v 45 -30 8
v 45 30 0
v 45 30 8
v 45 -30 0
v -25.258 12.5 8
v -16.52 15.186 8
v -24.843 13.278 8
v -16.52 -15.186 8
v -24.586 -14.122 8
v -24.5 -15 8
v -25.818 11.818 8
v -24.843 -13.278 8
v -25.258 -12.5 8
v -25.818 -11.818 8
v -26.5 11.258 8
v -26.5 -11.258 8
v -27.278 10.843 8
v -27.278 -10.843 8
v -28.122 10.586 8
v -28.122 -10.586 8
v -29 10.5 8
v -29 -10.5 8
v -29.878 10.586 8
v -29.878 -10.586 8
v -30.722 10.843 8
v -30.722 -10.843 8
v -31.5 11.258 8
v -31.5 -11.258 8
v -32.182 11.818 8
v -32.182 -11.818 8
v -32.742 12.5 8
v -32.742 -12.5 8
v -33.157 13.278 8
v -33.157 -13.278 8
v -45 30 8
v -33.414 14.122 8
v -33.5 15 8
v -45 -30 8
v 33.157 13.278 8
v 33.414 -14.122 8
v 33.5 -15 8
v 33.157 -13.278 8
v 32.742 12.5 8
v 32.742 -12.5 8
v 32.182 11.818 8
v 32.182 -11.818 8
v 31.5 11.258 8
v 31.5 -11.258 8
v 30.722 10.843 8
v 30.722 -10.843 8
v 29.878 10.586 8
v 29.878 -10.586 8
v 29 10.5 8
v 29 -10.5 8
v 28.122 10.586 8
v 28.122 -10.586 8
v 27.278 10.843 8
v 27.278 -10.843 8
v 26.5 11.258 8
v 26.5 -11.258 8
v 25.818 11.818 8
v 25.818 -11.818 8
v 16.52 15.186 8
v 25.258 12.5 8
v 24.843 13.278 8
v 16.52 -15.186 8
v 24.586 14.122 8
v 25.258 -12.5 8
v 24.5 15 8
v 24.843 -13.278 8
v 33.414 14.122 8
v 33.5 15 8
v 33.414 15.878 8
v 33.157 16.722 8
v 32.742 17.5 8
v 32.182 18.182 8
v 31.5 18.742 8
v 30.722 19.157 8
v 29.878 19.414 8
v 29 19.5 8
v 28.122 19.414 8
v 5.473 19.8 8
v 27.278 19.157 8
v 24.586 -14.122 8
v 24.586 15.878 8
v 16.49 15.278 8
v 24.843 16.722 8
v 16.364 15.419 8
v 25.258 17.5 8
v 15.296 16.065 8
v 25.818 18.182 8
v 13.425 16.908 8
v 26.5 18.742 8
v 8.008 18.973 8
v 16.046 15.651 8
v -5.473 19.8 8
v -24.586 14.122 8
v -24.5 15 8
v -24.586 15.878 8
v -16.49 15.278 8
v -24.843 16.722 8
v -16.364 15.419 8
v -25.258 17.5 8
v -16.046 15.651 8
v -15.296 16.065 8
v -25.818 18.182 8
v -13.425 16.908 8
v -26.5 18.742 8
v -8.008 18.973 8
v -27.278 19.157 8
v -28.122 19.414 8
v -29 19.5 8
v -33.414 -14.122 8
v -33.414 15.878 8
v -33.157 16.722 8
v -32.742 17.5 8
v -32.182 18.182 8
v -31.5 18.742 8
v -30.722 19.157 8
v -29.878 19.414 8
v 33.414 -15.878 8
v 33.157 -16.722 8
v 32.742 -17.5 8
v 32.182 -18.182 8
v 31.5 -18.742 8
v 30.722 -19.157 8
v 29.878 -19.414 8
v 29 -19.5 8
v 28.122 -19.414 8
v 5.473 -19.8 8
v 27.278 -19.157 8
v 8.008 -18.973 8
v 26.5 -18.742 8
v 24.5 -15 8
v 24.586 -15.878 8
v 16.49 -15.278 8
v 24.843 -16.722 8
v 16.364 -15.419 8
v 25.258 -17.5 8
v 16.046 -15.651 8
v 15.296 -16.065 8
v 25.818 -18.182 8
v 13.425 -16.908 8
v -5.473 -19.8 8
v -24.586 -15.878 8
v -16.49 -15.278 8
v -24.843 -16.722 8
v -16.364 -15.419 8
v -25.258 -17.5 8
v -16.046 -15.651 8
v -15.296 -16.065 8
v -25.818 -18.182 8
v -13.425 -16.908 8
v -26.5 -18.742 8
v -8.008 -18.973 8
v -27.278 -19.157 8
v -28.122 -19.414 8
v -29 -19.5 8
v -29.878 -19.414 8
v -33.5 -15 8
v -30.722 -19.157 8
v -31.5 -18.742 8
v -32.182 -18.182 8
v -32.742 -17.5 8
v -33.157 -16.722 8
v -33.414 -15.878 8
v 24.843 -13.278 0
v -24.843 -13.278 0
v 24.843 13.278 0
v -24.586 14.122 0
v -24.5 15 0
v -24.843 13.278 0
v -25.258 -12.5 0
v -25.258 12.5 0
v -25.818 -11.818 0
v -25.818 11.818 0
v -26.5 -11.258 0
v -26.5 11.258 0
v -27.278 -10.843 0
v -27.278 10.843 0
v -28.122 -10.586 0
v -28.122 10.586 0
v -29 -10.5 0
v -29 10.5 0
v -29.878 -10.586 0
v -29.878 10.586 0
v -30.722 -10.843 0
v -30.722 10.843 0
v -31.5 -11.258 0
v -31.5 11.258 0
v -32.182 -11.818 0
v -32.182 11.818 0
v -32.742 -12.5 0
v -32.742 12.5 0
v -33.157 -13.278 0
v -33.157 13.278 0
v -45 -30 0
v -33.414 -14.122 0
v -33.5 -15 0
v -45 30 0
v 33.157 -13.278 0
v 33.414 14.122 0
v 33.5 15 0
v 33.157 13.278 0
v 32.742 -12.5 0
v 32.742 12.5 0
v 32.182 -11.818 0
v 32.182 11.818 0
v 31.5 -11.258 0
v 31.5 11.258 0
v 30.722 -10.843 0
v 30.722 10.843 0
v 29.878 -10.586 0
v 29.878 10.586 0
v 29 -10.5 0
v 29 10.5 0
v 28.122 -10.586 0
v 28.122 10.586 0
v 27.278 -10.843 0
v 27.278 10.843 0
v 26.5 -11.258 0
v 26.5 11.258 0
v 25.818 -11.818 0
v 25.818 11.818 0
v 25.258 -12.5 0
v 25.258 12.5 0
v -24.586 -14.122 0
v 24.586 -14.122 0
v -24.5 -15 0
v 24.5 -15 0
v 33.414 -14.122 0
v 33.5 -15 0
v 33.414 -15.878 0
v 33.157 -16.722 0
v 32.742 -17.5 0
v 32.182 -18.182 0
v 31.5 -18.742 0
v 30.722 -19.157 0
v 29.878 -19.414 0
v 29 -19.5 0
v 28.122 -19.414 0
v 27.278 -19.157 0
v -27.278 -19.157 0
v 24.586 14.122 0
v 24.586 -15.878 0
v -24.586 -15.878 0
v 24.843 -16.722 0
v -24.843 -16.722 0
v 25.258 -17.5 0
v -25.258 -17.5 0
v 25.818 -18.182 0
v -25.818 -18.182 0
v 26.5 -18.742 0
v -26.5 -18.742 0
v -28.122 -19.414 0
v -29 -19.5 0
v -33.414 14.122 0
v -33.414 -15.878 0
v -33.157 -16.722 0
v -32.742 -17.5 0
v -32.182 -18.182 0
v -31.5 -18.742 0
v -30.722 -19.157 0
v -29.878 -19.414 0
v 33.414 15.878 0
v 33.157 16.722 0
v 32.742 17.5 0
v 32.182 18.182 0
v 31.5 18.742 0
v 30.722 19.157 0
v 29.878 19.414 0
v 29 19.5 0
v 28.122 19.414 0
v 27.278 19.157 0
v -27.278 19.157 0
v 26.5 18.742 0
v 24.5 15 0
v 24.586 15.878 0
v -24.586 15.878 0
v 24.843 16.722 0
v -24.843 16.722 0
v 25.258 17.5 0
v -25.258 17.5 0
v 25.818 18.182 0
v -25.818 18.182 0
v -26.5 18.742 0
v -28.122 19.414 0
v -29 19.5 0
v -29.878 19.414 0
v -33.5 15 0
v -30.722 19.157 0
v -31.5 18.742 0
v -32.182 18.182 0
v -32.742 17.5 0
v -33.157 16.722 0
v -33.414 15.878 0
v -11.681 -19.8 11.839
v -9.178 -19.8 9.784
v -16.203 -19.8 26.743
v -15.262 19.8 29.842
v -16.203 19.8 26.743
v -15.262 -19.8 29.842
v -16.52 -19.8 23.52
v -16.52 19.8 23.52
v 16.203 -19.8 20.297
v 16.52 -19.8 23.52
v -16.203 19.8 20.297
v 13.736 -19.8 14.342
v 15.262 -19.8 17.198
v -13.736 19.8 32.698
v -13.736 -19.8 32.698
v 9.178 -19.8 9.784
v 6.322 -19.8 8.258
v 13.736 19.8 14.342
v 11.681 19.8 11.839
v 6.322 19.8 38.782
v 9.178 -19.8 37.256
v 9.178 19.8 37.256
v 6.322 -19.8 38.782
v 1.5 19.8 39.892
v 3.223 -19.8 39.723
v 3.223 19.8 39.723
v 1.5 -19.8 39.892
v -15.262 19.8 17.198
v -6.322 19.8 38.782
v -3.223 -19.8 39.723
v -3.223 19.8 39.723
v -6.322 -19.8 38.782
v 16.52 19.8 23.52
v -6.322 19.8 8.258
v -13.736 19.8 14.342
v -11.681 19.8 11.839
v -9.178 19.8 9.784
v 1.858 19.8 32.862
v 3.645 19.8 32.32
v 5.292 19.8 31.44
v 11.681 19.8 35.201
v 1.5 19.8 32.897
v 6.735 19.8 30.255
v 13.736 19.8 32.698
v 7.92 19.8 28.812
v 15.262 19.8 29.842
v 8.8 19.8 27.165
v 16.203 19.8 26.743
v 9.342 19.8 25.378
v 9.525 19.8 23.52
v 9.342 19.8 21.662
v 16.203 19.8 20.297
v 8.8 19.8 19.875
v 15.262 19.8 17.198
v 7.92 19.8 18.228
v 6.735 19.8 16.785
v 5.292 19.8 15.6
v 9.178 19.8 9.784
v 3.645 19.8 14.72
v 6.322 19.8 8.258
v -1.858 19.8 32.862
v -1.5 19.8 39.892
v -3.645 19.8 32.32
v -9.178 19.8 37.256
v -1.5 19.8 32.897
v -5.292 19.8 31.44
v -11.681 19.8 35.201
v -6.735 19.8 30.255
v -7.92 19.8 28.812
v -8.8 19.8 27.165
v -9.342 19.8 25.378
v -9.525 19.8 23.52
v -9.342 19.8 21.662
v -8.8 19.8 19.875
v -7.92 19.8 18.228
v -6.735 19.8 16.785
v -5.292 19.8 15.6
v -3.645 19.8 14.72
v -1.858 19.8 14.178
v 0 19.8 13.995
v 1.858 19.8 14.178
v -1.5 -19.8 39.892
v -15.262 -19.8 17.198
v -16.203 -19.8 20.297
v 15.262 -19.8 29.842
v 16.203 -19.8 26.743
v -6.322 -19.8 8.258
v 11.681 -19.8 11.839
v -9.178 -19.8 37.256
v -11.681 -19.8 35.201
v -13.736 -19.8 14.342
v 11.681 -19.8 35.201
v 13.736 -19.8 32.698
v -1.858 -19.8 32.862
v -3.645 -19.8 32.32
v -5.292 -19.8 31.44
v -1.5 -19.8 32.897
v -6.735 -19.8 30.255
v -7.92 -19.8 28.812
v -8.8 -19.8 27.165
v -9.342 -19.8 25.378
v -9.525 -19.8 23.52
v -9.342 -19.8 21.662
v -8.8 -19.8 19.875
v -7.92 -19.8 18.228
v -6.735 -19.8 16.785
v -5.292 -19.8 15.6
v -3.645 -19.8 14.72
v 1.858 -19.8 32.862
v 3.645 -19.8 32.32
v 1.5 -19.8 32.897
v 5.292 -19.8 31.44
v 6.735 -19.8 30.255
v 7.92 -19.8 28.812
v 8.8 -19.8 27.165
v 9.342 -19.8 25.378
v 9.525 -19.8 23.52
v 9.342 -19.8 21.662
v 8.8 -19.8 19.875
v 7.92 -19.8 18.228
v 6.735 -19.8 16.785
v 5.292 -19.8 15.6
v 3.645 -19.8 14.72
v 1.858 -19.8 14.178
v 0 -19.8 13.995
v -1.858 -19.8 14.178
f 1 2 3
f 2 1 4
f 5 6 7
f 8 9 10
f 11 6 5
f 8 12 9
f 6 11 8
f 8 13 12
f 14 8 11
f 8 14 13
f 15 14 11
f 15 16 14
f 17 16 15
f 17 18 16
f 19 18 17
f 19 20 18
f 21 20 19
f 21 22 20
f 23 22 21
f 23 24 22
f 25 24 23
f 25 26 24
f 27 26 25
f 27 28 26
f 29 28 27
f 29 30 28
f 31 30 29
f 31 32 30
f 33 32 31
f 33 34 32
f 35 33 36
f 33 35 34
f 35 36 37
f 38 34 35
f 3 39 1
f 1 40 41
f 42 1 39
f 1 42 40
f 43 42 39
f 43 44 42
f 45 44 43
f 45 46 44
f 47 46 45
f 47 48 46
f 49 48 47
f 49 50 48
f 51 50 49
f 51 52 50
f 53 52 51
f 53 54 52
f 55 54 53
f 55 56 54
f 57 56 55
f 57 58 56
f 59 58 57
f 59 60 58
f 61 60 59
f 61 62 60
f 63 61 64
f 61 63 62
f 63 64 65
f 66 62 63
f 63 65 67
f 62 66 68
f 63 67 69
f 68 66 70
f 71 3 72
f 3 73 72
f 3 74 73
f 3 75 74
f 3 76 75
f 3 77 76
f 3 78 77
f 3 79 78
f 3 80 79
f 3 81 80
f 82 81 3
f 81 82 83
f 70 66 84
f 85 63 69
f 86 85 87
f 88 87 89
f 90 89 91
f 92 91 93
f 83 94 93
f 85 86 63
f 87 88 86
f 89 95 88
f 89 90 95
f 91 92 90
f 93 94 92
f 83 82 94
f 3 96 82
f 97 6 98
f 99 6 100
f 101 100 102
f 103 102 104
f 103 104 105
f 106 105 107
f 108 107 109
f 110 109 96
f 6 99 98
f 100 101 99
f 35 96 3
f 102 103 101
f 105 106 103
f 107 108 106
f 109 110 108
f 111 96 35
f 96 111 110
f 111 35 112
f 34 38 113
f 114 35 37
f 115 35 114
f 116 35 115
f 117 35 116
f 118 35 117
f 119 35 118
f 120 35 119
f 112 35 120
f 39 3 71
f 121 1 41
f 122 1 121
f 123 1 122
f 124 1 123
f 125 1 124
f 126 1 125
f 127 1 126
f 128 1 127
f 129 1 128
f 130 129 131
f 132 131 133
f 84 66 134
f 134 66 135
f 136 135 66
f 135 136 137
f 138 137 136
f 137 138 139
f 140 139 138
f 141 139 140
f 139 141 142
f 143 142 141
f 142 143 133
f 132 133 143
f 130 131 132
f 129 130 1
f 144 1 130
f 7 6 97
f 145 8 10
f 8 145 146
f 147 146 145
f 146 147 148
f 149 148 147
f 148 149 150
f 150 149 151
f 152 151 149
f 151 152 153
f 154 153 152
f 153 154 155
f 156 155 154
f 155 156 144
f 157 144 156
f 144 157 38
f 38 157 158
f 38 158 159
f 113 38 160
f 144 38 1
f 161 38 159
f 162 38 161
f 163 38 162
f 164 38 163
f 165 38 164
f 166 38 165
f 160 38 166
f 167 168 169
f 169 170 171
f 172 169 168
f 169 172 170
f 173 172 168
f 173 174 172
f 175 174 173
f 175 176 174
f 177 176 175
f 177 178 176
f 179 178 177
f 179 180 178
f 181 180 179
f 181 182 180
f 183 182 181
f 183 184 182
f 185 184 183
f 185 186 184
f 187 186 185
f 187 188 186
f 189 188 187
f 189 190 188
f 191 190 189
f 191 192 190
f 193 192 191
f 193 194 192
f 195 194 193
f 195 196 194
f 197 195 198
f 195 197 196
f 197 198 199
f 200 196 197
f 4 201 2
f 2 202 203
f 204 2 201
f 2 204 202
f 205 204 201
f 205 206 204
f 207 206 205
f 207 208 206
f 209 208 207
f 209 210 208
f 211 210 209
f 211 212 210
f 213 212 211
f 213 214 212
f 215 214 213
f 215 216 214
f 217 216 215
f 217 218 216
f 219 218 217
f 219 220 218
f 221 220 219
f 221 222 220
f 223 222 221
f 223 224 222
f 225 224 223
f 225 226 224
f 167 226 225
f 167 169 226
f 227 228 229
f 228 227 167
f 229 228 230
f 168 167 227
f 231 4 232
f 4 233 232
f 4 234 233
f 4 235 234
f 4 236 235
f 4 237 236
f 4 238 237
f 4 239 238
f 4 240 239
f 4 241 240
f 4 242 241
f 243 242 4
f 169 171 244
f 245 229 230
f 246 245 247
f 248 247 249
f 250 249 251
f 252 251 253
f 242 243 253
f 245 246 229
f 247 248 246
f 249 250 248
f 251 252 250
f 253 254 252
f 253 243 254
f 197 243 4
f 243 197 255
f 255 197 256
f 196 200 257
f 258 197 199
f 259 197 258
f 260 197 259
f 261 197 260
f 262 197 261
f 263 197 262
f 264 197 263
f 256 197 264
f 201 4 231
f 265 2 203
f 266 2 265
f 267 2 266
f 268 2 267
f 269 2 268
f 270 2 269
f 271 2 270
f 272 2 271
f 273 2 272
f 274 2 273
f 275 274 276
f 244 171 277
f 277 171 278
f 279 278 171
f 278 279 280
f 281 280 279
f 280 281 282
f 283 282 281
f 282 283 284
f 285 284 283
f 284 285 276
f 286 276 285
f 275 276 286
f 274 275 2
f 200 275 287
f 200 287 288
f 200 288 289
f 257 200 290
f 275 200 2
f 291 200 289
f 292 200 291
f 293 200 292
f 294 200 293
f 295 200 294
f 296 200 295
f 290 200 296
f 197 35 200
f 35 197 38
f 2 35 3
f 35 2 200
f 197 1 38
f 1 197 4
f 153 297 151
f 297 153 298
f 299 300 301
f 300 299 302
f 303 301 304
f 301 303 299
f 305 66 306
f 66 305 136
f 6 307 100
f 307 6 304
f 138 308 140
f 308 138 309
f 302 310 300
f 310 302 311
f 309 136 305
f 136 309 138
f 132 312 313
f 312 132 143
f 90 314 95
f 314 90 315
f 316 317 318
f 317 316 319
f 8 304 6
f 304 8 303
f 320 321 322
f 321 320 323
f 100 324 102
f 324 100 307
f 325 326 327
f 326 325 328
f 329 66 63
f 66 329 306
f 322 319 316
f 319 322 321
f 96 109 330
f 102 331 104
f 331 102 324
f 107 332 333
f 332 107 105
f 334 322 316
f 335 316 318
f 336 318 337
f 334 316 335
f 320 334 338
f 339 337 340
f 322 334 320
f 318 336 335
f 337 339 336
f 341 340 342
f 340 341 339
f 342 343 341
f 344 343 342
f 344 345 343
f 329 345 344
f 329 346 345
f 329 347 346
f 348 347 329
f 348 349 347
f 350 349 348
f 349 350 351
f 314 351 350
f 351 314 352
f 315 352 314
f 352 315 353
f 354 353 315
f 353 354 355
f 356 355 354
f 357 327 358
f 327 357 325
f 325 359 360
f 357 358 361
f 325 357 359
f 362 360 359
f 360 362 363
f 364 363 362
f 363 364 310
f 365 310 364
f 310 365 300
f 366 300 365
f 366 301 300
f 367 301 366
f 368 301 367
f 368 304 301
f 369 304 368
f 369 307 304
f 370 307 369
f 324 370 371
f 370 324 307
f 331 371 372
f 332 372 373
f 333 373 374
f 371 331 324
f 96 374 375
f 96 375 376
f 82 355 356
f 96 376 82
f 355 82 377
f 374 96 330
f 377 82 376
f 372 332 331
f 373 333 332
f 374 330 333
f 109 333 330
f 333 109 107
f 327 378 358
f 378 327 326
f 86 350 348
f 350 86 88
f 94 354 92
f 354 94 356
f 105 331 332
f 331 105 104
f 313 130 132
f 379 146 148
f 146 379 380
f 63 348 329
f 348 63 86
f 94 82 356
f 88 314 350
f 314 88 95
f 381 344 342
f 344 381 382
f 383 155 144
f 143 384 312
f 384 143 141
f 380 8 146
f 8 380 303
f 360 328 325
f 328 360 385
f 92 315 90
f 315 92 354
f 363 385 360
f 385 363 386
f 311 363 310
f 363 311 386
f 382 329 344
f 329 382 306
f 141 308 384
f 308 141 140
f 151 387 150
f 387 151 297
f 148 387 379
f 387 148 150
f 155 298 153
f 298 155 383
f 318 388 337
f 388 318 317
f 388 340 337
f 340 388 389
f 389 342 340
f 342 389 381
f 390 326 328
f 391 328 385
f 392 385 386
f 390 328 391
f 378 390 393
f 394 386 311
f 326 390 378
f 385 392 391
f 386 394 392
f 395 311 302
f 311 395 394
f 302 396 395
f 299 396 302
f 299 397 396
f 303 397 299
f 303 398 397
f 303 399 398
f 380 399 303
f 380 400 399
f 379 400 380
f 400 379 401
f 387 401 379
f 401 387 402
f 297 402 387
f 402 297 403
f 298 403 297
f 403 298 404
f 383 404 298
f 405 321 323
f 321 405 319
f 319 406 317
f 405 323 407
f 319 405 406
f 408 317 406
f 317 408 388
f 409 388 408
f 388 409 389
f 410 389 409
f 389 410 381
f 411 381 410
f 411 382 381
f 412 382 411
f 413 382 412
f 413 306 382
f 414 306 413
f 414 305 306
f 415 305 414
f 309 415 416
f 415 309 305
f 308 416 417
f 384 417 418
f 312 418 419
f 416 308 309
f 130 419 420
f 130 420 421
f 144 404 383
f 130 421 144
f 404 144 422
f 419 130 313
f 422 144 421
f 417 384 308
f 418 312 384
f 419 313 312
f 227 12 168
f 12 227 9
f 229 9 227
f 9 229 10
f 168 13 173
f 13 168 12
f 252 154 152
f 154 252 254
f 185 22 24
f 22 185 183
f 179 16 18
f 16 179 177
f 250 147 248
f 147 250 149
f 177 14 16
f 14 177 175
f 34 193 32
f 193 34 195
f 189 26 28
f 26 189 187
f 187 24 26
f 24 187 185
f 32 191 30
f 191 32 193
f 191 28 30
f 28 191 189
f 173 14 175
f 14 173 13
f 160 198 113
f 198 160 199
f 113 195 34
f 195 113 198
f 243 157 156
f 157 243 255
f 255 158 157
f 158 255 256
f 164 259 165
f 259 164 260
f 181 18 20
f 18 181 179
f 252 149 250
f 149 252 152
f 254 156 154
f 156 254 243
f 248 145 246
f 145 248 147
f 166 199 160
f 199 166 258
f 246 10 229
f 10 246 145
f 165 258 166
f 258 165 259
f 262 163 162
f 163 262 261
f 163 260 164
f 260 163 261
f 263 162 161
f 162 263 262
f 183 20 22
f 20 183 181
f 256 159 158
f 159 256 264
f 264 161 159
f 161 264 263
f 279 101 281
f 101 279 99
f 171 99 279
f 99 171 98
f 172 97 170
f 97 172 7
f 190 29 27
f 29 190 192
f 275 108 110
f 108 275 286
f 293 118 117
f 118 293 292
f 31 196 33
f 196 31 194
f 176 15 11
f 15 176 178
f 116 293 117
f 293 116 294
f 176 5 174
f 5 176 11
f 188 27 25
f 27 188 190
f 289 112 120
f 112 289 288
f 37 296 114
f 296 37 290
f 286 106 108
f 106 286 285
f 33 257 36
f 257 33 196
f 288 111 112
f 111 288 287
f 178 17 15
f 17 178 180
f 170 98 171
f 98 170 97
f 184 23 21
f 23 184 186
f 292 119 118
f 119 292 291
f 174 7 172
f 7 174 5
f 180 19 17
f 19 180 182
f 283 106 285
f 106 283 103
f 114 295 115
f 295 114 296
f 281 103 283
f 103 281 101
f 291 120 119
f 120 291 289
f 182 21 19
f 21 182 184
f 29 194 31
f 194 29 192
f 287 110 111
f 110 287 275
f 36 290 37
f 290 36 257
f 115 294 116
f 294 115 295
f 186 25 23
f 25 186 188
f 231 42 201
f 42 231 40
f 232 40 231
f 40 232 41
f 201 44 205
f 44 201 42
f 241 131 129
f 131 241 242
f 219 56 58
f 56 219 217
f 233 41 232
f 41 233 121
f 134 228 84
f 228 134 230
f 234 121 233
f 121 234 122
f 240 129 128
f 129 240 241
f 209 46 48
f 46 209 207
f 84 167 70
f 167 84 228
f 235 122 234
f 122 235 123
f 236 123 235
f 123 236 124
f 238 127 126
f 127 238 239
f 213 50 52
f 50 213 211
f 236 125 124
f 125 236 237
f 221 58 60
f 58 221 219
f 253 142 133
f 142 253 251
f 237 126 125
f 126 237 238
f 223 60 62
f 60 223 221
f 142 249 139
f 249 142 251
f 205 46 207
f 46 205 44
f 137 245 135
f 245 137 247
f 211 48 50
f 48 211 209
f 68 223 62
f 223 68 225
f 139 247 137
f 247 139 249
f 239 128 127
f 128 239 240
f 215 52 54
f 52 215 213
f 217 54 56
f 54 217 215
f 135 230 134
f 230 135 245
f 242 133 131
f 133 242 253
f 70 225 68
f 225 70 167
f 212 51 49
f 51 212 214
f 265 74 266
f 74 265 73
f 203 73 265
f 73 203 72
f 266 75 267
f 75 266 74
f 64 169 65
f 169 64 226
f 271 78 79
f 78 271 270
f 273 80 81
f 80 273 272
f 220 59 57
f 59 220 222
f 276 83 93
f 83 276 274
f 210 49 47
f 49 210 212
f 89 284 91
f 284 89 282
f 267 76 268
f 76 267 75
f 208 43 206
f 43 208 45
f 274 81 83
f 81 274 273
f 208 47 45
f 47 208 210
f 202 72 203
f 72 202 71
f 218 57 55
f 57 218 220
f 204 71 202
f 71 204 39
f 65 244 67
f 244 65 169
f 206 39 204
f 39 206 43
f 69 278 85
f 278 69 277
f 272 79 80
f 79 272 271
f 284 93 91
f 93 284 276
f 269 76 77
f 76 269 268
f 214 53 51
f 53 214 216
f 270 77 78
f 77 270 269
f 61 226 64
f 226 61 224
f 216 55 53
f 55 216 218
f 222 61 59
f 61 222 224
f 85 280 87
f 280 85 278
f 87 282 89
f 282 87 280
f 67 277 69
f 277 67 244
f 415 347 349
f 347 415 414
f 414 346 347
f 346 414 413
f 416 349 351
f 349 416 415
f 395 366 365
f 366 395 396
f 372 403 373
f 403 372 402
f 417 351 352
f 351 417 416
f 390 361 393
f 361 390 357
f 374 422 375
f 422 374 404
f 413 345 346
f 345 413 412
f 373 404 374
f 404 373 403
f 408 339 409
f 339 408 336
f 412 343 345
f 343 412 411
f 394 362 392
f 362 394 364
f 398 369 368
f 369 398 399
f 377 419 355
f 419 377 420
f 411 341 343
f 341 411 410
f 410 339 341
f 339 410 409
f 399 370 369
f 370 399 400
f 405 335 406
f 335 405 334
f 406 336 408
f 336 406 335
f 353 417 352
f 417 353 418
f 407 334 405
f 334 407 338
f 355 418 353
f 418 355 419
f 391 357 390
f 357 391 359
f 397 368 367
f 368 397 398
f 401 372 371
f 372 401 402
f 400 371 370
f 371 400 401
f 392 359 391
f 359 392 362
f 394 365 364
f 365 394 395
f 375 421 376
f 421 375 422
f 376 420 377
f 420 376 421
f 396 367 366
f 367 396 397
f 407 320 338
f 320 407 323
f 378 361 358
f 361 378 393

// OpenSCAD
$fn = 32;

// ----------------------------------------------------------------------
// Bearing block: 90 x 60 mm base, 19.05 mm bore at 23.52 mm
// ----------------------------------------------------------------------

// --- parameters (mm) ---
base_w = 90;              // base width
base_d = 60;              // base depth
base_t = 8;               // base thickness
bore_d = 19.05;           // shaft / bearing bore
house_r = 16.52;          // housing outer radius
house_len = 39.6;         // housing length along the shaft
foot_w = 33.04;           // foot width under the housing
foot_len = 29.6;          // foot length along the shaft
axis_z = 23.52;           // bore axis height above the base
holes_d = 9;              // mounting holes
hole_x = 29;              // mounting hole spacing
groove_w = 3;             // oil groove width

difference() {
  union() {
    /* base plate with its underside on z = 0 */
    translate([0, 0, base_t / 2]) cube([base_w, base_d, base_t], center = true);
    /* hull foot: a straight web blending into the round housing */
    hull() {
      translate([0, 0, base_t - 0.5]) cube([foot_w, foot_len, 1.6], center = true);
      translate([0, 0, axis_z]) rotate([-90, 0, 0]) cylinder(h = house_len, d = 2 * house_r, center = true);
    }
  }
  /* bore through the housing, 2.5 mm clear on both sides */
  translate([0, 0, axis_z]) rotate([-90, 0, 0]) cylinder(h = house_len + 5, d = bore_d, center = true);
  /* oil groove from the top of the housing into the bore */
  translate([-groove_w / 2, -house_len / 2 - 2.5, axis_z + bore_d * 0.17]) cube([groove_w, house_len + 5, house_r + 5]);
  /* mounting holes through the base plate */
  for (hx = [-29, 29]) {
    for (hy = [-15, 15]) {
      translate([hx, hy, -2.5]) cylinder(h = base_t + 5, d = holes_d);
    }
  }
}
